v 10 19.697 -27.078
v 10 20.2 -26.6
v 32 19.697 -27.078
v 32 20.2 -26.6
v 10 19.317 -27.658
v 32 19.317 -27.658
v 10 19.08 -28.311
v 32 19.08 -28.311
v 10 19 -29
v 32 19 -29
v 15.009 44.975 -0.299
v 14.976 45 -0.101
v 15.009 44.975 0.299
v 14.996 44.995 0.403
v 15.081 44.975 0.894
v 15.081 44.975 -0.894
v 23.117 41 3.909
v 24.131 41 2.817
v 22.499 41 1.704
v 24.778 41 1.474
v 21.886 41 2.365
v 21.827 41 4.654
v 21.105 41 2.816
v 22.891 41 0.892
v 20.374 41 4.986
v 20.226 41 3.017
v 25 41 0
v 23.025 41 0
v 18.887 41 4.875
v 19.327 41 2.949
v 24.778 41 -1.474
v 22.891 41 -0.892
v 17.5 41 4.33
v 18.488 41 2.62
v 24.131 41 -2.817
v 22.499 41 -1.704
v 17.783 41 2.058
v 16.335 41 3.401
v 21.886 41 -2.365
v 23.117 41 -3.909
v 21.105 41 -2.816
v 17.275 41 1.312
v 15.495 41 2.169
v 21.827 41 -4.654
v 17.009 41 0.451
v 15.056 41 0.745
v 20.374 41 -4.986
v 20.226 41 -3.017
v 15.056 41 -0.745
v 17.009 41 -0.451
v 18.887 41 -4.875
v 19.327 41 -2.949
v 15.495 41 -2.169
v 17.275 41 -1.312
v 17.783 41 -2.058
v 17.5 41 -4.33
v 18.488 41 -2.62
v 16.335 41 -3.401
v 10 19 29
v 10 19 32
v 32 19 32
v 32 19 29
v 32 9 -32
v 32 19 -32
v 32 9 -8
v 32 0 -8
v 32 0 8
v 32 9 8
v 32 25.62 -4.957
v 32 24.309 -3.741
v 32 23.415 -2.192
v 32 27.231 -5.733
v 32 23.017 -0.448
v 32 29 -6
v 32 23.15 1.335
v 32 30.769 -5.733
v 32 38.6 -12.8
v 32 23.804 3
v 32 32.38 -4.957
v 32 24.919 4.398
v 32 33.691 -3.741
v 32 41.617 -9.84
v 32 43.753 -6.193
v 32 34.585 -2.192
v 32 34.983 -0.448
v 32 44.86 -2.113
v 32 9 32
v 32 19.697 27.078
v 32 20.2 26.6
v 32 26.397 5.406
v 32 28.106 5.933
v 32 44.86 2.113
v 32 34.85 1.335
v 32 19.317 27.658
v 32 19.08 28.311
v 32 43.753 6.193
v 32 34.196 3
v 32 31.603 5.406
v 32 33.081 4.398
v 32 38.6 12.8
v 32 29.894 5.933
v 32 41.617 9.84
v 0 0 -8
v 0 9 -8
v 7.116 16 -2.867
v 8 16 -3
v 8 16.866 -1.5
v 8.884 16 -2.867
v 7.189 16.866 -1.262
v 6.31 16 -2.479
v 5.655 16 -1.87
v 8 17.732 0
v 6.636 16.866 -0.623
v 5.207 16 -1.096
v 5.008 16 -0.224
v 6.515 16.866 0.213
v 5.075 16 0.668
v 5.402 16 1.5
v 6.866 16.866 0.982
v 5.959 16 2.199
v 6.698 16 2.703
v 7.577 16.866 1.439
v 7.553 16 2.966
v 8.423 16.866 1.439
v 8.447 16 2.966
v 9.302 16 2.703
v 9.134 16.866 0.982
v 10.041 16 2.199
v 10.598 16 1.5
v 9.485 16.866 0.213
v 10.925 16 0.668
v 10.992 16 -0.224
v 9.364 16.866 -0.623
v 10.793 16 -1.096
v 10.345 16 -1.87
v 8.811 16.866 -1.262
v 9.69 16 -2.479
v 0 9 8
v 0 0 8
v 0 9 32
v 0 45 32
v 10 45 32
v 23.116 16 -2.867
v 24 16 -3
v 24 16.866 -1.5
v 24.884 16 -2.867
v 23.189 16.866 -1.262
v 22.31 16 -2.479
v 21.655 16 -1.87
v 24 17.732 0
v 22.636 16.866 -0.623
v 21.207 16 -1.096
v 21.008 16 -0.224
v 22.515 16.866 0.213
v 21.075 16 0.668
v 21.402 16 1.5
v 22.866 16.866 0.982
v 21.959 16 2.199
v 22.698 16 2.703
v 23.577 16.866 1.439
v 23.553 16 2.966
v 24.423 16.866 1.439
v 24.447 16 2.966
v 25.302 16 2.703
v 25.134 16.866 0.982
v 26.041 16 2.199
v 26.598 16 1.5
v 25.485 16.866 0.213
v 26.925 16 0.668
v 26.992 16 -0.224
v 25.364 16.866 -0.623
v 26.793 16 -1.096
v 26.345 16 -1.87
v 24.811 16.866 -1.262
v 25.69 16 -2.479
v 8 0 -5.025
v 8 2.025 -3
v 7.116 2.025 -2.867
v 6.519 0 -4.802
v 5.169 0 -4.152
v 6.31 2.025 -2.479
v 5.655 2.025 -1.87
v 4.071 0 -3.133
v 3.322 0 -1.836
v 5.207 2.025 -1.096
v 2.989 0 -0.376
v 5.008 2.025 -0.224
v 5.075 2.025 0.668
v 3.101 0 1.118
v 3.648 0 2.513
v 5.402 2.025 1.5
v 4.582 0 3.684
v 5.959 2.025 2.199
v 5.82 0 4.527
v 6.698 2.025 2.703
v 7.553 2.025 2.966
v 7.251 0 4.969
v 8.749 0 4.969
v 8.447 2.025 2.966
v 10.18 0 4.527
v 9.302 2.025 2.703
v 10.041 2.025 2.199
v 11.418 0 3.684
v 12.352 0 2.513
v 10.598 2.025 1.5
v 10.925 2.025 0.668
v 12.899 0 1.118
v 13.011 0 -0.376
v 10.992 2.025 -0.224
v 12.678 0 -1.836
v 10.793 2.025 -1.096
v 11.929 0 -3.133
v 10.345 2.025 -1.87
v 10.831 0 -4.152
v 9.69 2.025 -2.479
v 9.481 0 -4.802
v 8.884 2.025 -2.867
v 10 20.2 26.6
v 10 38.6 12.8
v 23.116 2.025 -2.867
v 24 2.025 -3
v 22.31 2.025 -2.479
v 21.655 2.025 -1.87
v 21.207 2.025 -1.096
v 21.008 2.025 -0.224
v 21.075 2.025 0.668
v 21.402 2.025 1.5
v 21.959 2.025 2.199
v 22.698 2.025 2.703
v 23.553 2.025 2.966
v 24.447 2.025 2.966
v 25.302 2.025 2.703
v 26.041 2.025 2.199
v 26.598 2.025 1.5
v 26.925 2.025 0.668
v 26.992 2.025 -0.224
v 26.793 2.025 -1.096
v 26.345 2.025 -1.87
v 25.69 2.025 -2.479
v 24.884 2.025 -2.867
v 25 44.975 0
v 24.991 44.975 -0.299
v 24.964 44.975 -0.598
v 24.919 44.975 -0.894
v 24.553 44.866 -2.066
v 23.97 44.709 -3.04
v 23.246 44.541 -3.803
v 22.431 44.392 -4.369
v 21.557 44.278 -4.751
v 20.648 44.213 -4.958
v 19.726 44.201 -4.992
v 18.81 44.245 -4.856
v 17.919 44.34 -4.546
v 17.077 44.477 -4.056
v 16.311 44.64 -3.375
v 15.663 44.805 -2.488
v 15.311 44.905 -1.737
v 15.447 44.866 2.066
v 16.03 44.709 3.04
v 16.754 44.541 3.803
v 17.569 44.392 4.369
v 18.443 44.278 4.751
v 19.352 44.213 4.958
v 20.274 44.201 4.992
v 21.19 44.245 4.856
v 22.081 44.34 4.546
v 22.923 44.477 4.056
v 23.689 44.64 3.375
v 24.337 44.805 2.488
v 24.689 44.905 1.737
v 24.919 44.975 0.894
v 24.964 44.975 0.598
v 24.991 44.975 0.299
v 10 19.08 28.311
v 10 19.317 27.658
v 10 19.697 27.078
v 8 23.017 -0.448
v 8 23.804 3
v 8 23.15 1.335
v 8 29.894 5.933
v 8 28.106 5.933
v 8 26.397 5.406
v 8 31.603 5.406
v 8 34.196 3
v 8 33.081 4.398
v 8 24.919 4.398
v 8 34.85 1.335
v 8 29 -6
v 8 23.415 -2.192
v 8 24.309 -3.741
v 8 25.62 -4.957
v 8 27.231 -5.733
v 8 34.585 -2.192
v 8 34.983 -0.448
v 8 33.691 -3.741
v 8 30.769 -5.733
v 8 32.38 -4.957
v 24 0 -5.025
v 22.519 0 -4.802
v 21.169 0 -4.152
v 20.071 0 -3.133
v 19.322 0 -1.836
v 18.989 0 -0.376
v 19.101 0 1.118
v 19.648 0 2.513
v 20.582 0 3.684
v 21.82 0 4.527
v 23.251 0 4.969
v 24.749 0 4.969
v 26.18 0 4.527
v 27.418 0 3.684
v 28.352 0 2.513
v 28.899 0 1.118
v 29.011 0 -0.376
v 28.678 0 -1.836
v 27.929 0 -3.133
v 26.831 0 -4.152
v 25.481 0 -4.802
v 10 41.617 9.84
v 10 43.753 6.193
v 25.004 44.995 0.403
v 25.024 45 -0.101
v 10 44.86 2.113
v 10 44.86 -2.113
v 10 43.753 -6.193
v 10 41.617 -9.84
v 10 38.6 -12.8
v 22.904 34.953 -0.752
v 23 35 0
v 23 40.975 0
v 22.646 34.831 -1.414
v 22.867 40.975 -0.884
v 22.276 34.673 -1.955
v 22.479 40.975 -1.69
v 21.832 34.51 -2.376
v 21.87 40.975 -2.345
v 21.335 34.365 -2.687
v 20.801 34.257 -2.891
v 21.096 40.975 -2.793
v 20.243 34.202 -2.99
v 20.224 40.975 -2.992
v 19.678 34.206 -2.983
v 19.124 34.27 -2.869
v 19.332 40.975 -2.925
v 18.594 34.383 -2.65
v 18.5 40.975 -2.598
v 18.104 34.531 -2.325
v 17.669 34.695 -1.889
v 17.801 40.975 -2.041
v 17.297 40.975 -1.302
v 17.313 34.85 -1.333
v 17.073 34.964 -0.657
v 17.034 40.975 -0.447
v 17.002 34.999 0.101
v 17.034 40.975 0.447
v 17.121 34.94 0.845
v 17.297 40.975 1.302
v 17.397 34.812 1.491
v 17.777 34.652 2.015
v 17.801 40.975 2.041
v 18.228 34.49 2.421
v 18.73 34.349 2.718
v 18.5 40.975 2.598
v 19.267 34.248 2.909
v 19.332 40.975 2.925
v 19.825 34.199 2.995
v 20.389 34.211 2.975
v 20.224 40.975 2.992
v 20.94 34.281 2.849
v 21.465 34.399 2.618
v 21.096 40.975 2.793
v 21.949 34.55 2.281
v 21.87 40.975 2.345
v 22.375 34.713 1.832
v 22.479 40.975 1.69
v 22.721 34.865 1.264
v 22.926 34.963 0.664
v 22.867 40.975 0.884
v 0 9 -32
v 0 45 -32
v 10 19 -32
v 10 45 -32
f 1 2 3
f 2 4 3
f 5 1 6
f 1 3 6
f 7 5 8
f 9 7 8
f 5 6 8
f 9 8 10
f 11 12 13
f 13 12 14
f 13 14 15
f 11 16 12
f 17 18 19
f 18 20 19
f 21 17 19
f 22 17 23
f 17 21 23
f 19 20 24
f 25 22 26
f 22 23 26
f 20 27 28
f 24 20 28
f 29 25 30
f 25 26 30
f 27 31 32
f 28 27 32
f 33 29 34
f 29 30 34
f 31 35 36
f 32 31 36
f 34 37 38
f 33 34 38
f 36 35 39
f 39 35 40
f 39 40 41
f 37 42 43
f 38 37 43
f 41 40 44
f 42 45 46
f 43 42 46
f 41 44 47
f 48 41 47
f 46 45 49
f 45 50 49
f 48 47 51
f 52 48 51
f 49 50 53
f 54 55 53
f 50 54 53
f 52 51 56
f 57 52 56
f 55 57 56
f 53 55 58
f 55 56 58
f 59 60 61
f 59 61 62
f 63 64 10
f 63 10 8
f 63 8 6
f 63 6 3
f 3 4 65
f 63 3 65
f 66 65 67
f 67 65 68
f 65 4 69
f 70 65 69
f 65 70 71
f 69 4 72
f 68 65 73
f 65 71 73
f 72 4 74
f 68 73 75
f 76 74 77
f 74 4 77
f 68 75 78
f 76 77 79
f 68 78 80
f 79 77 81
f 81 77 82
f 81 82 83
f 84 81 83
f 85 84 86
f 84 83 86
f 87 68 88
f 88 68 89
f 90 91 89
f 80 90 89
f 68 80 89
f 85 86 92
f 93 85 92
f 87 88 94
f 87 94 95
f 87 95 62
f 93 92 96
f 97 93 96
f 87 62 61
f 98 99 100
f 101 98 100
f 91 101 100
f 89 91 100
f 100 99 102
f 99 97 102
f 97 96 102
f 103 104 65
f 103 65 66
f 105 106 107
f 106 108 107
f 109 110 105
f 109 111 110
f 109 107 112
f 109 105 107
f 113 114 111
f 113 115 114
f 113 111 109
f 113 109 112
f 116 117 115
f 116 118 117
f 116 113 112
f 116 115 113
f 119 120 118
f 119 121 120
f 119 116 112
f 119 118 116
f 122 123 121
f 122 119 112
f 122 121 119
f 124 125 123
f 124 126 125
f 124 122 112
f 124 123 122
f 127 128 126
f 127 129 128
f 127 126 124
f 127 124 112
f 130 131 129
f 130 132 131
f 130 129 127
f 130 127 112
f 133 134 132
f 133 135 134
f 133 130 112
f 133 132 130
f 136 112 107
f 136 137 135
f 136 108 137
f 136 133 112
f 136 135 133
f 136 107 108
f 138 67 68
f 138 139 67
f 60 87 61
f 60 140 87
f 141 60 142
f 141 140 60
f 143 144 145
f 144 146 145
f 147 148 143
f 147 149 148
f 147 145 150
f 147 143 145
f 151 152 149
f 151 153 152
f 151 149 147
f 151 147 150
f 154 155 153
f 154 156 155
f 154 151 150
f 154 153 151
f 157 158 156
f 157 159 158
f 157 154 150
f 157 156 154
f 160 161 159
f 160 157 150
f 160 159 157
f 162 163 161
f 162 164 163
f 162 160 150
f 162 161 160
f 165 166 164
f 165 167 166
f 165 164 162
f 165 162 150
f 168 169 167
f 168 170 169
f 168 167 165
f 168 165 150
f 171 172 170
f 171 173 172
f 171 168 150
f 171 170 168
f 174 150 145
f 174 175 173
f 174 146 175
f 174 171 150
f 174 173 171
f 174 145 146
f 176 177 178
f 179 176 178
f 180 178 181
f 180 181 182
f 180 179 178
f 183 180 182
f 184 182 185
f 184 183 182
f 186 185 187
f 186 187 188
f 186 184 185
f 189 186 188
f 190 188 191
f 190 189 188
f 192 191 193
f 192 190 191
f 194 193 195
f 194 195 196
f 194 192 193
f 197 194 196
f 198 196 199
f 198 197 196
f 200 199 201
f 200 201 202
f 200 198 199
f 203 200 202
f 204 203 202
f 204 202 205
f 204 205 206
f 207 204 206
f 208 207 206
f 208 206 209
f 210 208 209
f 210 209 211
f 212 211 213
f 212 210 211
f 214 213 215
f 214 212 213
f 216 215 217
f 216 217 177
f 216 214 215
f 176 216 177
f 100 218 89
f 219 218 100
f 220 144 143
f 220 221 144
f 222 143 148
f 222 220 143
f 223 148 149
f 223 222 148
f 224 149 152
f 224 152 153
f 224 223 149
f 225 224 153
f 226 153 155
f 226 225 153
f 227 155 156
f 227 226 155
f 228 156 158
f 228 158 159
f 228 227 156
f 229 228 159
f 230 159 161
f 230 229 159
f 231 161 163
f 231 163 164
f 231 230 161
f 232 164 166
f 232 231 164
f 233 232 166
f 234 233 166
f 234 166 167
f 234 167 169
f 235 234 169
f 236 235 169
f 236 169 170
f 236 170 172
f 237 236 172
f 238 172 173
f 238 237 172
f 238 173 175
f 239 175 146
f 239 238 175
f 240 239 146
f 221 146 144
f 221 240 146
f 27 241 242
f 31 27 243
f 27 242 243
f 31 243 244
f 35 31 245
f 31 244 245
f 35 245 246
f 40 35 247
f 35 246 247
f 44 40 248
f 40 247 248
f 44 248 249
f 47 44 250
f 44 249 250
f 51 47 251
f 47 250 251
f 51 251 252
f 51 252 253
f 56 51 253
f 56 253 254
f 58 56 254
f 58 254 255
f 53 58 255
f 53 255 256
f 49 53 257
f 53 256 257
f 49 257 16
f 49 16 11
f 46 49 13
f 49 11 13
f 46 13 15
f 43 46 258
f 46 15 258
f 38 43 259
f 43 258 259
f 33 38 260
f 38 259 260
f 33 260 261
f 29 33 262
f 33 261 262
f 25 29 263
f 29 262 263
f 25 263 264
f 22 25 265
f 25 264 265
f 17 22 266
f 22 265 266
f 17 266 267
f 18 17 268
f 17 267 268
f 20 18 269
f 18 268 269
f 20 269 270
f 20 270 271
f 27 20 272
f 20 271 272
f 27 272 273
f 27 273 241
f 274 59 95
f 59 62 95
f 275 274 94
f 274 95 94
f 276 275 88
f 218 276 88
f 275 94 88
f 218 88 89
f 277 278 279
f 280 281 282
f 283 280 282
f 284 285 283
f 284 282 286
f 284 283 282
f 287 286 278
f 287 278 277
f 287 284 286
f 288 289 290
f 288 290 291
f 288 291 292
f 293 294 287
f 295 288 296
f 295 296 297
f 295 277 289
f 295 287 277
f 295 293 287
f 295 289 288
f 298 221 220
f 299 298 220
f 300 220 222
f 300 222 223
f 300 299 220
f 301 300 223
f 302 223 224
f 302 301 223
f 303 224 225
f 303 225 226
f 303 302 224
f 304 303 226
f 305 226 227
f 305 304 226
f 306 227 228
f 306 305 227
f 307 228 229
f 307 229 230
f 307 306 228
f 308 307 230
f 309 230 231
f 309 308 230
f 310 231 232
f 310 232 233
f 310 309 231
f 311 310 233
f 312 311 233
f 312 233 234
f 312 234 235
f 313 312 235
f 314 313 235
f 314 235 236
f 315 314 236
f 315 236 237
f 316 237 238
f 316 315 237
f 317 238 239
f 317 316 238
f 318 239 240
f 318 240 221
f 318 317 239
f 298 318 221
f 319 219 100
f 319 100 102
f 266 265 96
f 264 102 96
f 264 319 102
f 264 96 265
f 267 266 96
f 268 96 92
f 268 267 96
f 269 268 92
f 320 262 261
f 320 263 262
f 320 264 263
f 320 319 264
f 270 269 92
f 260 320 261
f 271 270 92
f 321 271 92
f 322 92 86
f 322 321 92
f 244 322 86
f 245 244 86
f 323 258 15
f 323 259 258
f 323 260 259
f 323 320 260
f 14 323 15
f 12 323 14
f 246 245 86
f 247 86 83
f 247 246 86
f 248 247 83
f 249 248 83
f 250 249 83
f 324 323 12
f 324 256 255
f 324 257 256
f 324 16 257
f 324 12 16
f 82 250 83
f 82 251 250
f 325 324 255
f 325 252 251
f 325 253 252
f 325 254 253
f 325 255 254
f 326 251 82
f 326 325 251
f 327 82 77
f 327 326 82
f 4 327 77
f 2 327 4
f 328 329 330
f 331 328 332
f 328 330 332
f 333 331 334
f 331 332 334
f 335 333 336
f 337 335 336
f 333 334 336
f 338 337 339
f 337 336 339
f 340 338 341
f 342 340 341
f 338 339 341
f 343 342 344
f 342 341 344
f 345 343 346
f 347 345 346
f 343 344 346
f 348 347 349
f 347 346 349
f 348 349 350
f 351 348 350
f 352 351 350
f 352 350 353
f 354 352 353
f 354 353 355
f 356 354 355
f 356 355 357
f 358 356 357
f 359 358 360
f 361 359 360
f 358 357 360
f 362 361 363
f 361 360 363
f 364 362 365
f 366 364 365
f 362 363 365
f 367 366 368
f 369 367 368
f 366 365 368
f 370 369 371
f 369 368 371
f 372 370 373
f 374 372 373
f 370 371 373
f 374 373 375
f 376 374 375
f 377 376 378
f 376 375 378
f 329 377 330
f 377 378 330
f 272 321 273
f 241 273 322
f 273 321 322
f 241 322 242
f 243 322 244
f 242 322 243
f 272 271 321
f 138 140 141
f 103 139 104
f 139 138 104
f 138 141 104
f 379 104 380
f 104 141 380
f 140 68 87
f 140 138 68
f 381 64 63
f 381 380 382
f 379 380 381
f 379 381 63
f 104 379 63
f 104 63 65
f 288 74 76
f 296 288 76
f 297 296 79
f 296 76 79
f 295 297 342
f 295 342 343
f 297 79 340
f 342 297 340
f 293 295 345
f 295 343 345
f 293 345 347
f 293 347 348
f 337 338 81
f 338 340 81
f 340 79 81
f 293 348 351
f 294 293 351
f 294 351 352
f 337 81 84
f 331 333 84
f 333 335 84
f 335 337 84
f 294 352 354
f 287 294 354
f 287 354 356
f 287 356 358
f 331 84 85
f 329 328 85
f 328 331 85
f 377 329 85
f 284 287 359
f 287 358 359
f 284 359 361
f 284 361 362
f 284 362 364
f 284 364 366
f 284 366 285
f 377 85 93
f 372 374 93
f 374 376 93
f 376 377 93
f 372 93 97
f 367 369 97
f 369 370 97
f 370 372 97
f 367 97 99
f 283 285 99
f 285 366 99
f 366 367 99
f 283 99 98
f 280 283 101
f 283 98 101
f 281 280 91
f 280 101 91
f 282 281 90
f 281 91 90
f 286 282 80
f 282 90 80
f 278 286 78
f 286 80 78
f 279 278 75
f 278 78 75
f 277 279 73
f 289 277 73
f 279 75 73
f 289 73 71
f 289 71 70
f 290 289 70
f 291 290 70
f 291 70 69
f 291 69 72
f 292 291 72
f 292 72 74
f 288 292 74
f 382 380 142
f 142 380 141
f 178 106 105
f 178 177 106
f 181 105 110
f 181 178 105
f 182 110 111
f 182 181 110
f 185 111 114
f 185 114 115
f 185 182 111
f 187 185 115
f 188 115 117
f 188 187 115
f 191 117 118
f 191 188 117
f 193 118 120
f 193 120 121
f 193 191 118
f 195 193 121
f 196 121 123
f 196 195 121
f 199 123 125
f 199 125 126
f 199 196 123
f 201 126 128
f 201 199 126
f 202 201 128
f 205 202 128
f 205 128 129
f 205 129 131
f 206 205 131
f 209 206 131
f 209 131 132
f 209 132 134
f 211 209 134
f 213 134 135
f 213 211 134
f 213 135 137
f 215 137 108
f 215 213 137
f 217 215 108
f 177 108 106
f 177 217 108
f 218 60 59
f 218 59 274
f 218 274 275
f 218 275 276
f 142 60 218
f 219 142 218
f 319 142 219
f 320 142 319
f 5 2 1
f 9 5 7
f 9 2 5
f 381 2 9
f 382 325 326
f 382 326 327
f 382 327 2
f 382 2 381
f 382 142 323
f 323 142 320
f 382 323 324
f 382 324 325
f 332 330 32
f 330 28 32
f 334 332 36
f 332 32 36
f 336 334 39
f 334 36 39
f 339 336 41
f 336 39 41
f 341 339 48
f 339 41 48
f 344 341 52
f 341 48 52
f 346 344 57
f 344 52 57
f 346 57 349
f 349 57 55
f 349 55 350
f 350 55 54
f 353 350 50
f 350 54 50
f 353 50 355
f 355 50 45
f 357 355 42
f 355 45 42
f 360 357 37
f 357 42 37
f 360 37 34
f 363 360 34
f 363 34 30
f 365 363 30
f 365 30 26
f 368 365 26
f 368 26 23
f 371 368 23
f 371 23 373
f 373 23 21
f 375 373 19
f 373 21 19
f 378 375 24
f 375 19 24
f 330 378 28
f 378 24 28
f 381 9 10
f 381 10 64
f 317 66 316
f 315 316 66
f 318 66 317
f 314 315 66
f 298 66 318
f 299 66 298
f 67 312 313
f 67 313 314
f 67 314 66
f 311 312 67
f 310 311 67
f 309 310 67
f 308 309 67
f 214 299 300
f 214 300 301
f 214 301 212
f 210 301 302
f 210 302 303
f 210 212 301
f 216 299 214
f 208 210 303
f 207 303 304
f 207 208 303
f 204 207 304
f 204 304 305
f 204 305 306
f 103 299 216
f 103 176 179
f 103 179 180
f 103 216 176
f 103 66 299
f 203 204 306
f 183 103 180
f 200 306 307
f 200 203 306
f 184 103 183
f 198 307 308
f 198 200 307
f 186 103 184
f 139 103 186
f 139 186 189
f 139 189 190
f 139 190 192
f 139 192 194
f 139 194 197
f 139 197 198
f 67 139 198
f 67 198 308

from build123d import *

# Parameters (mm, degrees)
BOSS_EXTRUDE1_DEPTH = 10
BOSS_EXTRUDE2_DEPTH = 22
SKETCH3_R           = 6
CUT_EXTRUDE1_DEPTH  = 24
LPATTERN1_COUNT     = 2
LPATTERN1_PITCH     = 16
FILLET1_R           = 3


# Read off the part's stored shape, not the designer's step: CBORE for M5 Hex Head Bolt1
with BuildPart() as part:
    # Sketch1 → Boss-Extrude1 (new body)
    with BuildSketch(Plane(origin=(0, 0, 0), x_dir=(0, 0, -1), z_dir=(1, 0, 0))):
        Polygon((-8, 0), (8, 0), (8, 9), (32, 9), (32, 45), (-32, 45), (-32, 9), (-8, 9), align=None)
    extrude(amount=BOSS_EXTRUDE1_DEPTH)

    # Sketch2 → Boss-Extrude2 (add)
    with BuildSketch(Plane(origin=(10, 0, 0), x_dir=(0, 0, -1), z_dir=(1, 0, 0))):
        with BuildLine():
            Line((-32, 9), (-32, 19))
            Line((-32, 19), (-27.5, 19))
            Line((-27.5, 19), (-12.799996672, 38.599999783))
            ThreePointArc((-12.799996672, 38.599999783), (0, 44.999997208), (12.799996672, 38.599999783))
            Line((12.799996672, 38.599999783), (27.5, 19))
            Line((27.5, 19), (32, 19))
            Line((32, 19), (32, 9))
            Line((32, 9), (8, 9))
            Line((8, 9), (8, 0))
            Line((8, 0), (-8, 0))
            Line((-8, 0), (-8, 9))
            Line((-8, 9), (-32, 9))
        make_face()
    extrude(amount=BOSS_EXTRUDE2_DEPTH)

    # Sketch3 → Cut-Extrude1 (cut)
    with BuildSketch(Plane(origin=(32, 0, 0), x_dir=(0, 0, -1), z_dir=(1, 0, 0))):
        with Locations((0, 29)):
            Circle(SKETCH3_R)
    extrude(amount=-CUT_EXTRUDE1_DEPTH, mode=Mode.SUBTRACT)

    # CBORE for M5 Hex Head Bolt1 outline → CBORE for M5 Hex Head Bolt1 (revolve, cut)
    with BuildSketch(Plane(origin=(20, 0, 0), x_dir=(1, 0, 0), z_dir=(0, 0, 1))):
        Polygon((3.025, 41), (5, 41), (5, 44.975), (5.025014792, 45.000014792), (0, 45.000014792), (0, 34.195854076), (3, 34.195854076), (3, 40.975), align=None)
    revolve(axis=Axis((20, 0, 0), (0, 1, 0)), mode=Mode.SUBTRACT)

    # Sketch9 → Ø1.0mm Dowel Hole1 (revolve, cut)
    with BuildSketch(Plane(origin=(24, 0, 0), x_dir=(0, 0, -1), z_dir=(1, 0, 0))):
        Polygon((0, 0), (0, 17.732050808), (3, 16), (3, 2.025), (5.025, 0), align=None)
    f_1_0mm_dowel_hole1 = revolve(axis=Axis((24, -6.35, 0), (0, 1, 0)), mode=Mode.SUBTRACT)

    # LPattern1: Ø1.0mm Dowel Hole1 ×2
    with Locations(*[(-i * LPATTERN1_PITCH, 0, 0) for i in range(1, LPATTERN1_COUNT)]):
        add(f_1_0mm_dowel_hole1, mode=Mode.SUBTRACT)

    # Fillet1
    fillet1_edges = [part.edges().sort_by_distance(p)[0] for p in [
        (21, 19, 27.5),
        (21, 19, -27.5),
    ]]
    fillet(fillet1_edges, radius=FILLET1_R)


solid = part.part
